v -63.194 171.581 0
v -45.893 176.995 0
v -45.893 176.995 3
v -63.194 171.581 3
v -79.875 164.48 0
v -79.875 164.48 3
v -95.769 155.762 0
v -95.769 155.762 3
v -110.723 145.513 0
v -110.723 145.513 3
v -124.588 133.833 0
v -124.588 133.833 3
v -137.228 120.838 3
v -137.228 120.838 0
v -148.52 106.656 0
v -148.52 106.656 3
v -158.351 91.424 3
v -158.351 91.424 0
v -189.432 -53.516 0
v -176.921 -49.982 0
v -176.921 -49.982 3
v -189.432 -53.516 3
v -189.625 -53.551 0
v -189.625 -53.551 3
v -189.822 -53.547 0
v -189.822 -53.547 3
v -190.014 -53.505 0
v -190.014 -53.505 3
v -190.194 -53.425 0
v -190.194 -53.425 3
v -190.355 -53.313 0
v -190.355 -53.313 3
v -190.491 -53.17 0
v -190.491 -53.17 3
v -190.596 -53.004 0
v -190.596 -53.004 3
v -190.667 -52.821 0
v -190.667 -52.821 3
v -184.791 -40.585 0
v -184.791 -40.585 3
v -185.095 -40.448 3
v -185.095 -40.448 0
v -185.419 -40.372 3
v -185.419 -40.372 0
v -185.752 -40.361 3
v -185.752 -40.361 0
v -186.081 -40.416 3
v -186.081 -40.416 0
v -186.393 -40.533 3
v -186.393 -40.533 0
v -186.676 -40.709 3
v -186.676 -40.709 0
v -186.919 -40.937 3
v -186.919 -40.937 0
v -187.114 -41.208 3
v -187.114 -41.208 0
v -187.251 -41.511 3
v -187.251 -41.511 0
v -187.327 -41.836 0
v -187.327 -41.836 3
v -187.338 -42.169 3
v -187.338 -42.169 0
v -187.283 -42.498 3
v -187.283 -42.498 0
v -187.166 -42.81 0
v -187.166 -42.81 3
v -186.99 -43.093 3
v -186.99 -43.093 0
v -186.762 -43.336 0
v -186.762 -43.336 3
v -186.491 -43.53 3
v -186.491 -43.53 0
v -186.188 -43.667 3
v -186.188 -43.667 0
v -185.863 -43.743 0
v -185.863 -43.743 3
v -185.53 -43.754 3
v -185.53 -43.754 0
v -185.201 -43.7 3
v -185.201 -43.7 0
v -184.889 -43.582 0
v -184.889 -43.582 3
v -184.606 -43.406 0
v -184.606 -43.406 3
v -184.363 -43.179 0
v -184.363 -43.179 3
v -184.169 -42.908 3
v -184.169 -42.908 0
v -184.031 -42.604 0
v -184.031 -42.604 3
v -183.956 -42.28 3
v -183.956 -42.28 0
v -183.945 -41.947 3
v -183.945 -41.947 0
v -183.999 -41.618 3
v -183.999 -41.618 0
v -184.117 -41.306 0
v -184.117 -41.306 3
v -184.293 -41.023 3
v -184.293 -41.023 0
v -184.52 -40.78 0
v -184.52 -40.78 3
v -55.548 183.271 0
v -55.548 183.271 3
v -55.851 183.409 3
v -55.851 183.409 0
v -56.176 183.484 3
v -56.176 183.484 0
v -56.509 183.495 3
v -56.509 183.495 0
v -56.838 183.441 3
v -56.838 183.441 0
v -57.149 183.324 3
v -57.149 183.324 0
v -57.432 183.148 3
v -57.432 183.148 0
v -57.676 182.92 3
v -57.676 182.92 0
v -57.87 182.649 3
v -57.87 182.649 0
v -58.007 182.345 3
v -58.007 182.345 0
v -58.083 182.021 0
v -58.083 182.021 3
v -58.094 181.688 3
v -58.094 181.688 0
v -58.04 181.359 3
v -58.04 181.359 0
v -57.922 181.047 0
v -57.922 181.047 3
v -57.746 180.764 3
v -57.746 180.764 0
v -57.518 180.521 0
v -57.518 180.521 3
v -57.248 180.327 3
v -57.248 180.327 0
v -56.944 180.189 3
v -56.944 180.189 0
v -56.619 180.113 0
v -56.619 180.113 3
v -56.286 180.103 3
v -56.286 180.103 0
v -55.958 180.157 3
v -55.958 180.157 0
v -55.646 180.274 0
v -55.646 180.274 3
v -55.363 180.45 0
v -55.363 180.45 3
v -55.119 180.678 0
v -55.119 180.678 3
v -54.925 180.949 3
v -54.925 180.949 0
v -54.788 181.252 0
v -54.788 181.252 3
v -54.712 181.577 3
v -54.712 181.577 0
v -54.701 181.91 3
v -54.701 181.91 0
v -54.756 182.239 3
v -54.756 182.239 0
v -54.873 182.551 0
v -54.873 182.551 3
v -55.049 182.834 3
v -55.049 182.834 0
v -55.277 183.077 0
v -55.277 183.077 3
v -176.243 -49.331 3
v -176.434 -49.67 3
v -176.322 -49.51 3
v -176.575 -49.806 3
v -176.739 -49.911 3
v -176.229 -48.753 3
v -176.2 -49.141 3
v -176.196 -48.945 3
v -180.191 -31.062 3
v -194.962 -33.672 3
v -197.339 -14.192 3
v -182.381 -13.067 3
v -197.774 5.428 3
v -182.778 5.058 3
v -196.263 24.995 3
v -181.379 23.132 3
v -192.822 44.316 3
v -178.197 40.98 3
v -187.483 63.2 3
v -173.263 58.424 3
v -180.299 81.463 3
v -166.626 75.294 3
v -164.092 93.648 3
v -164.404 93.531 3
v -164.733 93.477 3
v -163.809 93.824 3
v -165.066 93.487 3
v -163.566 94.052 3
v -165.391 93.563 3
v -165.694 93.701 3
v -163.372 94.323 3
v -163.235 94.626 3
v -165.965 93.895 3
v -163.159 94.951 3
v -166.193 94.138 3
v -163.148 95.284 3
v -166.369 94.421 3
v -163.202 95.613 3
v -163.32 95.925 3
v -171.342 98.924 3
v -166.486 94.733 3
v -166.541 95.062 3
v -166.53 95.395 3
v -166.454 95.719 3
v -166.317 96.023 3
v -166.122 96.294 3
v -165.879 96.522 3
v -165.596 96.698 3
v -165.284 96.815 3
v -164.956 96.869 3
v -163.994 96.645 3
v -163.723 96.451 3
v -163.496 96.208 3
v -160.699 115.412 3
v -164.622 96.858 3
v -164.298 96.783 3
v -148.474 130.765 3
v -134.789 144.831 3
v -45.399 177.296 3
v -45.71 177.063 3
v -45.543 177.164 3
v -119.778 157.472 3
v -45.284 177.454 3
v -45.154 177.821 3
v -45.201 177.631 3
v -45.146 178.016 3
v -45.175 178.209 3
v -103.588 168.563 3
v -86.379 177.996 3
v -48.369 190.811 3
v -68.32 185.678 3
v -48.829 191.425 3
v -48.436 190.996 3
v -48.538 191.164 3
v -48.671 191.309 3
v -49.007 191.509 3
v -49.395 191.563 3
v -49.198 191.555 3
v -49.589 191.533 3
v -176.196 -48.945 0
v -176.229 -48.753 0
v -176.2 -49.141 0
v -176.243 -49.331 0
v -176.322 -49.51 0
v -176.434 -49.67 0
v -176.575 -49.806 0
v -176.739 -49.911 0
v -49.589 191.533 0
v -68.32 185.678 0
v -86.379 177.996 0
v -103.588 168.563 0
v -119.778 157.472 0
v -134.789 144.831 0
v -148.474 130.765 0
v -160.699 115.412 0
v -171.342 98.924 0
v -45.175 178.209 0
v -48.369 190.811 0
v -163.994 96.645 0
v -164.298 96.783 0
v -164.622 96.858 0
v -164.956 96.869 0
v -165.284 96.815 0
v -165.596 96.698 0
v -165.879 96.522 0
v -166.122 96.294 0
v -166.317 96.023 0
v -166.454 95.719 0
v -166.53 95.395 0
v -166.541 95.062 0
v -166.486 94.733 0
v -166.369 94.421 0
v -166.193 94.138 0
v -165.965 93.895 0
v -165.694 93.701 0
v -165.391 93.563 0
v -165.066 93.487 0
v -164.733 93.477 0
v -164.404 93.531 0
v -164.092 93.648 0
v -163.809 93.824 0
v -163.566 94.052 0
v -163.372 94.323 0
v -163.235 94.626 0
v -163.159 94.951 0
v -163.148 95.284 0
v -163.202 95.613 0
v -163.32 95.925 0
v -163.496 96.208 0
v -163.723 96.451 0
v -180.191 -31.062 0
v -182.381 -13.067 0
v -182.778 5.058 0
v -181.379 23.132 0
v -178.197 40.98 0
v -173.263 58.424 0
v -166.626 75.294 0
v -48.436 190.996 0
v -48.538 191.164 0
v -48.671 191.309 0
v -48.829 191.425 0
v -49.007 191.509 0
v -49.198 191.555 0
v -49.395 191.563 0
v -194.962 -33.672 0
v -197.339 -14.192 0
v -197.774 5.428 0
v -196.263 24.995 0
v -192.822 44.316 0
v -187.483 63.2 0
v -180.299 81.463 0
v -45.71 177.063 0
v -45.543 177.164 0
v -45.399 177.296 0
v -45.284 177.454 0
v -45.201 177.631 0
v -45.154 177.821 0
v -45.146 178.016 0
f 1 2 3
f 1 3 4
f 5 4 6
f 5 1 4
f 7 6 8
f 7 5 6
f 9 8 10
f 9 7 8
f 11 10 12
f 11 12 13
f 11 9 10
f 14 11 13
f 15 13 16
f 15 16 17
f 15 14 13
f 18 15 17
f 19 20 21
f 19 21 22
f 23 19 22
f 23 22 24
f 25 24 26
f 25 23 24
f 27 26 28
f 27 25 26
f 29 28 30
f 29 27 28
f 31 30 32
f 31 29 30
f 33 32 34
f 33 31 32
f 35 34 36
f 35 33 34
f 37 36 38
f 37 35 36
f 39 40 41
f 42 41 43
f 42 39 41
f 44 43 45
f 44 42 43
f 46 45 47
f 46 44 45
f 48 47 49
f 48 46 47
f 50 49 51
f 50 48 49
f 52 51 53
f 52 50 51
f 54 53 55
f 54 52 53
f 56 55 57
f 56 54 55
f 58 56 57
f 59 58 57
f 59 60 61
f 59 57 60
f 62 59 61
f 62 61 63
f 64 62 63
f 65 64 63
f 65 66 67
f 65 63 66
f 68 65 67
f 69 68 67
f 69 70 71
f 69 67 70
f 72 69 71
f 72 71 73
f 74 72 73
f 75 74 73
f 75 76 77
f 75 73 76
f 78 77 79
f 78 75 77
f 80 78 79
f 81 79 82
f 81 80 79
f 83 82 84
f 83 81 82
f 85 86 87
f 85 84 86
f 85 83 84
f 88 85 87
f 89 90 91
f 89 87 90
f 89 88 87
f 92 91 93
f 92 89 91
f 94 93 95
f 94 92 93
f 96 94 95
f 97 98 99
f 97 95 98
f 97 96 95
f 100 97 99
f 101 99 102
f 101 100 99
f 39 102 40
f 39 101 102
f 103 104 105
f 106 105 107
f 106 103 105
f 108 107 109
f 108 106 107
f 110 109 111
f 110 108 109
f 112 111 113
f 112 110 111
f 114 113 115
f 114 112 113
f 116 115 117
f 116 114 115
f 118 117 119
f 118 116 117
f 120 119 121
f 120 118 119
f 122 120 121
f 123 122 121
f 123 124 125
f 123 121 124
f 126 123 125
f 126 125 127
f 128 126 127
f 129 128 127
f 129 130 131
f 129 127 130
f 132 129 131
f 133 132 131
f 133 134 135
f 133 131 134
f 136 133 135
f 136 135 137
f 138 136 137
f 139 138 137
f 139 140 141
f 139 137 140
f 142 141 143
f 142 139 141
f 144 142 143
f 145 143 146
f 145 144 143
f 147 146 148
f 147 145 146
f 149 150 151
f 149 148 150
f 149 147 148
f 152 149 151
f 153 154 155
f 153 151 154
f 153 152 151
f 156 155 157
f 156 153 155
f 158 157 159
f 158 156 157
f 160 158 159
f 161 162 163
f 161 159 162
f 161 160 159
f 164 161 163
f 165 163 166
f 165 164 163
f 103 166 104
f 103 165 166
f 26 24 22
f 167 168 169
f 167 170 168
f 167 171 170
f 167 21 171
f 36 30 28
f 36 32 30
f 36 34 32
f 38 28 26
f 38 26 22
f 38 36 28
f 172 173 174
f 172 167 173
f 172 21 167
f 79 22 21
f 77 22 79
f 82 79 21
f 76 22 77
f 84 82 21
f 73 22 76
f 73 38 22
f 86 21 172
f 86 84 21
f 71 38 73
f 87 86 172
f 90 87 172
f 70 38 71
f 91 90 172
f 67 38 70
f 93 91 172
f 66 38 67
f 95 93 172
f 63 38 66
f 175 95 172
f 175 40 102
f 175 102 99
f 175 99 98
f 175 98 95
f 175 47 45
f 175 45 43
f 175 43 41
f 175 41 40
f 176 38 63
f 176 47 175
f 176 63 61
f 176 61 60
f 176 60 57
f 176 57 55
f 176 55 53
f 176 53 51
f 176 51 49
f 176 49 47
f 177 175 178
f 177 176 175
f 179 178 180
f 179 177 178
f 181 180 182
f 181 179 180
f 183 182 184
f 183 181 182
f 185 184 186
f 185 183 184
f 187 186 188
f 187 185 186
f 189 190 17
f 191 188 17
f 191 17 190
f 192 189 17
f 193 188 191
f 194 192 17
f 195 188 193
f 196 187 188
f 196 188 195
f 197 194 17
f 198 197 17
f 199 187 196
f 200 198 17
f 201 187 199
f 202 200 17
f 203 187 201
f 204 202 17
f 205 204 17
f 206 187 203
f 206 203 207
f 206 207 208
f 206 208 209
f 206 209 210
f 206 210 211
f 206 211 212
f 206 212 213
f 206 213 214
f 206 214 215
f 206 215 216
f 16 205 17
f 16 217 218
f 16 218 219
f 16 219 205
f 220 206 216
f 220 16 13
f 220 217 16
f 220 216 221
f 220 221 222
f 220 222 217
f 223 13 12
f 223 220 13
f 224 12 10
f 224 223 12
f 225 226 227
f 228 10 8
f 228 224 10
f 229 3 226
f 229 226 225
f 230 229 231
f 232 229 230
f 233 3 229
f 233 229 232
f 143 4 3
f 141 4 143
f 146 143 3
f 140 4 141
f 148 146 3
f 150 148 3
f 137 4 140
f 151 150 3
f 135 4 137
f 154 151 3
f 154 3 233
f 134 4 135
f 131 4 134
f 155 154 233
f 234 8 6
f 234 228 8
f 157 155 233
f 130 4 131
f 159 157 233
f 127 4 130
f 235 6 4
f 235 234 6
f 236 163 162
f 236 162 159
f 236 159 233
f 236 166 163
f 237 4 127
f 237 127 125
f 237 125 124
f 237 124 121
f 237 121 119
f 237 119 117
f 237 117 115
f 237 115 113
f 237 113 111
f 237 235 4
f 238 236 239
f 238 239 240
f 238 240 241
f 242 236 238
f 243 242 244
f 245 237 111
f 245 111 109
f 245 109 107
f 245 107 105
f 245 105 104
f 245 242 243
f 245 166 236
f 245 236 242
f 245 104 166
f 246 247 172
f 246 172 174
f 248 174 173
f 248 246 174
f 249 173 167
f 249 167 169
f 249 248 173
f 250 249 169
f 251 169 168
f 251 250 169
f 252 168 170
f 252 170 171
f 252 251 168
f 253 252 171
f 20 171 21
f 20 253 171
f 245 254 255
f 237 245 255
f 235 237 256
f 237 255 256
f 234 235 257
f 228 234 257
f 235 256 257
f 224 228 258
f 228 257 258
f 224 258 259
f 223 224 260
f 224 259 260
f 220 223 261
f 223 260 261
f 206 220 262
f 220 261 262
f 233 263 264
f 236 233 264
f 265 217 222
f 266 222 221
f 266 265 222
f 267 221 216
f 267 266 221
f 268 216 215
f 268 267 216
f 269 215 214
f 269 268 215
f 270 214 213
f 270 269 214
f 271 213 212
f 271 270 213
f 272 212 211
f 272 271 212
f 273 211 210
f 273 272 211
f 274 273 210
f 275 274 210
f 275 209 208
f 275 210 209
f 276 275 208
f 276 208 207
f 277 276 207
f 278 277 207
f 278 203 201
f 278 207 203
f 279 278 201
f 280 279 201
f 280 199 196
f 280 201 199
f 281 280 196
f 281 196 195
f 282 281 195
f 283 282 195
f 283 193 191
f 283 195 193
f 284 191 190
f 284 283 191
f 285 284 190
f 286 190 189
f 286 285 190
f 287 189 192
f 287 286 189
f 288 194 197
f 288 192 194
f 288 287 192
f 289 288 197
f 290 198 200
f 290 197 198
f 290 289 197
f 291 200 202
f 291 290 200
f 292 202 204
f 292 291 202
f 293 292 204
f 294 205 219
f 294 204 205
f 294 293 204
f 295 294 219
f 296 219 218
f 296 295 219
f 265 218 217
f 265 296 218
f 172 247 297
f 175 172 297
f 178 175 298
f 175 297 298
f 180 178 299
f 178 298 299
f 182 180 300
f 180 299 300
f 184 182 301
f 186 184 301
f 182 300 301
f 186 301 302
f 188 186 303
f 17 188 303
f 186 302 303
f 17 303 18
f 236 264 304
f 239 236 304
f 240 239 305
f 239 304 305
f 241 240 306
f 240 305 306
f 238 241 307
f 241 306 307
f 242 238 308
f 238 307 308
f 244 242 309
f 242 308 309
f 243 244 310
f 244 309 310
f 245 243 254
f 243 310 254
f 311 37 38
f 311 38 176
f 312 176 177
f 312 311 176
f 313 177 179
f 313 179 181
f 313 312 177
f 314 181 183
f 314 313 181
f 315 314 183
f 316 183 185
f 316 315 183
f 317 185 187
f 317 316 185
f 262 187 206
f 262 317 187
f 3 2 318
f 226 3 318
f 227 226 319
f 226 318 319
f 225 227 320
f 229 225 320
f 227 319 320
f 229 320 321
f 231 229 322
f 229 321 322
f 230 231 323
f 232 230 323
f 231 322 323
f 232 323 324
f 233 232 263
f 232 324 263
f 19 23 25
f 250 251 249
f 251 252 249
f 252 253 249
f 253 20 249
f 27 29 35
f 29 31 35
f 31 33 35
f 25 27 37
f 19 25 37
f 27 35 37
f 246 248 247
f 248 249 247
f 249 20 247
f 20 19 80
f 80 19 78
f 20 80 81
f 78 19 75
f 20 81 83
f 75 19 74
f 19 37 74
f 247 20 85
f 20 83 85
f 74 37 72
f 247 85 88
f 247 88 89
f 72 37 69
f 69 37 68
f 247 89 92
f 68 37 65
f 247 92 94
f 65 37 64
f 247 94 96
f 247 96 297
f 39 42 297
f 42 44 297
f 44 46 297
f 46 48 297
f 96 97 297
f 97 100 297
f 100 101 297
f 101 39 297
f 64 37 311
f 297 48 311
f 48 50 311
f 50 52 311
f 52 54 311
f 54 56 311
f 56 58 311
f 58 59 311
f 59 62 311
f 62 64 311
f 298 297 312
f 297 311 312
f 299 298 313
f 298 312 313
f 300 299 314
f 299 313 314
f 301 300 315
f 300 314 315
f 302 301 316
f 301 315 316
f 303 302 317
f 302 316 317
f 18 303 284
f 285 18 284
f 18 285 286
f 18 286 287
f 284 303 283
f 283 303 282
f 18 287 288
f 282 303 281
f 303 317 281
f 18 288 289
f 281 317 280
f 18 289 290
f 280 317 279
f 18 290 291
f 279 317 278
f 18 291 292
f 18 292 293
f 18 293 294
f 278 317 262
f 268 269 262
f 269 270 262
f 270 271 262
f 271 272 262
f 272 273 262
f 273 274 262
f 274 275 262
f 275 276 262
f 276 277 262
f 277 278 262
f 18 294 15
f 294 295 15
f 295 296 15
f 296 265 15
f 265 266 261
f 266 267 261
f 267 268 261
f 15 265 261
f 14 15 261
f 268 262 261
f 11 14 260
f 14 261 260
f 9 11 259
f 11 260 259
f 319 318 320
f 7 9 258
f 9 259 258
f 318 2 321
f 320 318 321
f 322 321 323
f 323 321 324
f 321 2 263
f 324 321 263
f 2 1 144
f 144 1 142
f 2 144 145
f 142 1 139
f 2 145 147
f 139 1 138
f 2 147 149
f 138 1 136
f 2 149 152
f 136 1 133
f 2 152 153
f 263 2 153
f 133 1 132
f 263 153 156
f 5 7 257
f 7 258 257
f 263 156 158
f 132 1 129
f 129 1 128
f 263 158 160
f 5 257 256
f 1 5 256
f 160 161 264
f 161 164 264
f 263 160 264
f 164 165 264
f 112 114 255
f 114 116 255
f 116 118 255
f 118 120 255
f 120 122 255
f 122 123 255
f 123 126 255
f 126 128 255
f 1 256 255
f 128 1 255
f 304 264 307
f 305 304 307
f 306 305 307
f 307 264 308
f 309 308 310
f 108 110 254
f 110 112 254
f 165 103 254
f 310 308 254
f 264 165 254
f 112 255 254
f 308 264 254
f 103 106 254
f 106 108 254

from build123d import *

# Parameters (mm, degrees)
PAD015_DEPTH                        = 3
SKETCH054_R                         = 1.7
POCKET018_DEPTH                     = 0.001
POCKET018_DEPTH_BACK                = 3.001
BODY001003005003004_PLACEMENT_ANGLE = 60


with BuildPart() as part:
    # Sketch053 → Pad015 (new body)
    with BuildSketch(Plane.XY):
        with BuildLine():
            Line((0, 182.848457), (0, 197.848457))
            ThreePointArc((141.077868, 138.712102), (76.485413, 182.466418), (0, 197.848457))
            ThreePointArc((141.062279, 137.294387), (141.364747, 138.000004), (141.077868, 138.712102))
            Line((131.746186, 128.227134), (141.062279, 137.294387))
            ThreePointArc((130.335906, 128.242388), (131.037899, 127.943805), (131.746186, 128.227134))
            ThreePointArc((130.335906, 128.242388), (70.656336, 168.64531), (0, 182.848457))
        make_face()
    pad015 = extrude(amount=PAD015_DEPTH)

    # Mirrored020: Pad015 across Sketch053 V_Axis
    add(pad015.mirror(Plane(origin=(0, 0, 0), x_dir=(0, 0, 1), z_dir=(1, 0, 0))))

    # Sketch054 → Pocket018 (cut, two sides)
    with BuildSketch(Plane.XY) as pocket018_sk:
        with Locations((129.243686, 139.741203)):
            Circle(SKETCH054_R)
        with Locations((0, 190.345828)):
            Circle(SKETCH054_R)
        with Locations((-129.243686, 139.741203)):
            Circle(SKETCH054_R)
    extrude(amount=-POCKET018_DEPTH, mode=Mode.SUBTRACT)
    extrude(pocket018_sk.sketch, amount=POCKET018_DEPTH_BACK, mode=Mode.SUBTRACT)


with BuildPart() as part_1:
    # Body001003005003004 placement: moved
    add(part.part.rotate(Axis((0, 0, 0), (0, 0, 1)), BODY001003005003004_PLACEMENT_ANGLE))


solid = part_1.part
